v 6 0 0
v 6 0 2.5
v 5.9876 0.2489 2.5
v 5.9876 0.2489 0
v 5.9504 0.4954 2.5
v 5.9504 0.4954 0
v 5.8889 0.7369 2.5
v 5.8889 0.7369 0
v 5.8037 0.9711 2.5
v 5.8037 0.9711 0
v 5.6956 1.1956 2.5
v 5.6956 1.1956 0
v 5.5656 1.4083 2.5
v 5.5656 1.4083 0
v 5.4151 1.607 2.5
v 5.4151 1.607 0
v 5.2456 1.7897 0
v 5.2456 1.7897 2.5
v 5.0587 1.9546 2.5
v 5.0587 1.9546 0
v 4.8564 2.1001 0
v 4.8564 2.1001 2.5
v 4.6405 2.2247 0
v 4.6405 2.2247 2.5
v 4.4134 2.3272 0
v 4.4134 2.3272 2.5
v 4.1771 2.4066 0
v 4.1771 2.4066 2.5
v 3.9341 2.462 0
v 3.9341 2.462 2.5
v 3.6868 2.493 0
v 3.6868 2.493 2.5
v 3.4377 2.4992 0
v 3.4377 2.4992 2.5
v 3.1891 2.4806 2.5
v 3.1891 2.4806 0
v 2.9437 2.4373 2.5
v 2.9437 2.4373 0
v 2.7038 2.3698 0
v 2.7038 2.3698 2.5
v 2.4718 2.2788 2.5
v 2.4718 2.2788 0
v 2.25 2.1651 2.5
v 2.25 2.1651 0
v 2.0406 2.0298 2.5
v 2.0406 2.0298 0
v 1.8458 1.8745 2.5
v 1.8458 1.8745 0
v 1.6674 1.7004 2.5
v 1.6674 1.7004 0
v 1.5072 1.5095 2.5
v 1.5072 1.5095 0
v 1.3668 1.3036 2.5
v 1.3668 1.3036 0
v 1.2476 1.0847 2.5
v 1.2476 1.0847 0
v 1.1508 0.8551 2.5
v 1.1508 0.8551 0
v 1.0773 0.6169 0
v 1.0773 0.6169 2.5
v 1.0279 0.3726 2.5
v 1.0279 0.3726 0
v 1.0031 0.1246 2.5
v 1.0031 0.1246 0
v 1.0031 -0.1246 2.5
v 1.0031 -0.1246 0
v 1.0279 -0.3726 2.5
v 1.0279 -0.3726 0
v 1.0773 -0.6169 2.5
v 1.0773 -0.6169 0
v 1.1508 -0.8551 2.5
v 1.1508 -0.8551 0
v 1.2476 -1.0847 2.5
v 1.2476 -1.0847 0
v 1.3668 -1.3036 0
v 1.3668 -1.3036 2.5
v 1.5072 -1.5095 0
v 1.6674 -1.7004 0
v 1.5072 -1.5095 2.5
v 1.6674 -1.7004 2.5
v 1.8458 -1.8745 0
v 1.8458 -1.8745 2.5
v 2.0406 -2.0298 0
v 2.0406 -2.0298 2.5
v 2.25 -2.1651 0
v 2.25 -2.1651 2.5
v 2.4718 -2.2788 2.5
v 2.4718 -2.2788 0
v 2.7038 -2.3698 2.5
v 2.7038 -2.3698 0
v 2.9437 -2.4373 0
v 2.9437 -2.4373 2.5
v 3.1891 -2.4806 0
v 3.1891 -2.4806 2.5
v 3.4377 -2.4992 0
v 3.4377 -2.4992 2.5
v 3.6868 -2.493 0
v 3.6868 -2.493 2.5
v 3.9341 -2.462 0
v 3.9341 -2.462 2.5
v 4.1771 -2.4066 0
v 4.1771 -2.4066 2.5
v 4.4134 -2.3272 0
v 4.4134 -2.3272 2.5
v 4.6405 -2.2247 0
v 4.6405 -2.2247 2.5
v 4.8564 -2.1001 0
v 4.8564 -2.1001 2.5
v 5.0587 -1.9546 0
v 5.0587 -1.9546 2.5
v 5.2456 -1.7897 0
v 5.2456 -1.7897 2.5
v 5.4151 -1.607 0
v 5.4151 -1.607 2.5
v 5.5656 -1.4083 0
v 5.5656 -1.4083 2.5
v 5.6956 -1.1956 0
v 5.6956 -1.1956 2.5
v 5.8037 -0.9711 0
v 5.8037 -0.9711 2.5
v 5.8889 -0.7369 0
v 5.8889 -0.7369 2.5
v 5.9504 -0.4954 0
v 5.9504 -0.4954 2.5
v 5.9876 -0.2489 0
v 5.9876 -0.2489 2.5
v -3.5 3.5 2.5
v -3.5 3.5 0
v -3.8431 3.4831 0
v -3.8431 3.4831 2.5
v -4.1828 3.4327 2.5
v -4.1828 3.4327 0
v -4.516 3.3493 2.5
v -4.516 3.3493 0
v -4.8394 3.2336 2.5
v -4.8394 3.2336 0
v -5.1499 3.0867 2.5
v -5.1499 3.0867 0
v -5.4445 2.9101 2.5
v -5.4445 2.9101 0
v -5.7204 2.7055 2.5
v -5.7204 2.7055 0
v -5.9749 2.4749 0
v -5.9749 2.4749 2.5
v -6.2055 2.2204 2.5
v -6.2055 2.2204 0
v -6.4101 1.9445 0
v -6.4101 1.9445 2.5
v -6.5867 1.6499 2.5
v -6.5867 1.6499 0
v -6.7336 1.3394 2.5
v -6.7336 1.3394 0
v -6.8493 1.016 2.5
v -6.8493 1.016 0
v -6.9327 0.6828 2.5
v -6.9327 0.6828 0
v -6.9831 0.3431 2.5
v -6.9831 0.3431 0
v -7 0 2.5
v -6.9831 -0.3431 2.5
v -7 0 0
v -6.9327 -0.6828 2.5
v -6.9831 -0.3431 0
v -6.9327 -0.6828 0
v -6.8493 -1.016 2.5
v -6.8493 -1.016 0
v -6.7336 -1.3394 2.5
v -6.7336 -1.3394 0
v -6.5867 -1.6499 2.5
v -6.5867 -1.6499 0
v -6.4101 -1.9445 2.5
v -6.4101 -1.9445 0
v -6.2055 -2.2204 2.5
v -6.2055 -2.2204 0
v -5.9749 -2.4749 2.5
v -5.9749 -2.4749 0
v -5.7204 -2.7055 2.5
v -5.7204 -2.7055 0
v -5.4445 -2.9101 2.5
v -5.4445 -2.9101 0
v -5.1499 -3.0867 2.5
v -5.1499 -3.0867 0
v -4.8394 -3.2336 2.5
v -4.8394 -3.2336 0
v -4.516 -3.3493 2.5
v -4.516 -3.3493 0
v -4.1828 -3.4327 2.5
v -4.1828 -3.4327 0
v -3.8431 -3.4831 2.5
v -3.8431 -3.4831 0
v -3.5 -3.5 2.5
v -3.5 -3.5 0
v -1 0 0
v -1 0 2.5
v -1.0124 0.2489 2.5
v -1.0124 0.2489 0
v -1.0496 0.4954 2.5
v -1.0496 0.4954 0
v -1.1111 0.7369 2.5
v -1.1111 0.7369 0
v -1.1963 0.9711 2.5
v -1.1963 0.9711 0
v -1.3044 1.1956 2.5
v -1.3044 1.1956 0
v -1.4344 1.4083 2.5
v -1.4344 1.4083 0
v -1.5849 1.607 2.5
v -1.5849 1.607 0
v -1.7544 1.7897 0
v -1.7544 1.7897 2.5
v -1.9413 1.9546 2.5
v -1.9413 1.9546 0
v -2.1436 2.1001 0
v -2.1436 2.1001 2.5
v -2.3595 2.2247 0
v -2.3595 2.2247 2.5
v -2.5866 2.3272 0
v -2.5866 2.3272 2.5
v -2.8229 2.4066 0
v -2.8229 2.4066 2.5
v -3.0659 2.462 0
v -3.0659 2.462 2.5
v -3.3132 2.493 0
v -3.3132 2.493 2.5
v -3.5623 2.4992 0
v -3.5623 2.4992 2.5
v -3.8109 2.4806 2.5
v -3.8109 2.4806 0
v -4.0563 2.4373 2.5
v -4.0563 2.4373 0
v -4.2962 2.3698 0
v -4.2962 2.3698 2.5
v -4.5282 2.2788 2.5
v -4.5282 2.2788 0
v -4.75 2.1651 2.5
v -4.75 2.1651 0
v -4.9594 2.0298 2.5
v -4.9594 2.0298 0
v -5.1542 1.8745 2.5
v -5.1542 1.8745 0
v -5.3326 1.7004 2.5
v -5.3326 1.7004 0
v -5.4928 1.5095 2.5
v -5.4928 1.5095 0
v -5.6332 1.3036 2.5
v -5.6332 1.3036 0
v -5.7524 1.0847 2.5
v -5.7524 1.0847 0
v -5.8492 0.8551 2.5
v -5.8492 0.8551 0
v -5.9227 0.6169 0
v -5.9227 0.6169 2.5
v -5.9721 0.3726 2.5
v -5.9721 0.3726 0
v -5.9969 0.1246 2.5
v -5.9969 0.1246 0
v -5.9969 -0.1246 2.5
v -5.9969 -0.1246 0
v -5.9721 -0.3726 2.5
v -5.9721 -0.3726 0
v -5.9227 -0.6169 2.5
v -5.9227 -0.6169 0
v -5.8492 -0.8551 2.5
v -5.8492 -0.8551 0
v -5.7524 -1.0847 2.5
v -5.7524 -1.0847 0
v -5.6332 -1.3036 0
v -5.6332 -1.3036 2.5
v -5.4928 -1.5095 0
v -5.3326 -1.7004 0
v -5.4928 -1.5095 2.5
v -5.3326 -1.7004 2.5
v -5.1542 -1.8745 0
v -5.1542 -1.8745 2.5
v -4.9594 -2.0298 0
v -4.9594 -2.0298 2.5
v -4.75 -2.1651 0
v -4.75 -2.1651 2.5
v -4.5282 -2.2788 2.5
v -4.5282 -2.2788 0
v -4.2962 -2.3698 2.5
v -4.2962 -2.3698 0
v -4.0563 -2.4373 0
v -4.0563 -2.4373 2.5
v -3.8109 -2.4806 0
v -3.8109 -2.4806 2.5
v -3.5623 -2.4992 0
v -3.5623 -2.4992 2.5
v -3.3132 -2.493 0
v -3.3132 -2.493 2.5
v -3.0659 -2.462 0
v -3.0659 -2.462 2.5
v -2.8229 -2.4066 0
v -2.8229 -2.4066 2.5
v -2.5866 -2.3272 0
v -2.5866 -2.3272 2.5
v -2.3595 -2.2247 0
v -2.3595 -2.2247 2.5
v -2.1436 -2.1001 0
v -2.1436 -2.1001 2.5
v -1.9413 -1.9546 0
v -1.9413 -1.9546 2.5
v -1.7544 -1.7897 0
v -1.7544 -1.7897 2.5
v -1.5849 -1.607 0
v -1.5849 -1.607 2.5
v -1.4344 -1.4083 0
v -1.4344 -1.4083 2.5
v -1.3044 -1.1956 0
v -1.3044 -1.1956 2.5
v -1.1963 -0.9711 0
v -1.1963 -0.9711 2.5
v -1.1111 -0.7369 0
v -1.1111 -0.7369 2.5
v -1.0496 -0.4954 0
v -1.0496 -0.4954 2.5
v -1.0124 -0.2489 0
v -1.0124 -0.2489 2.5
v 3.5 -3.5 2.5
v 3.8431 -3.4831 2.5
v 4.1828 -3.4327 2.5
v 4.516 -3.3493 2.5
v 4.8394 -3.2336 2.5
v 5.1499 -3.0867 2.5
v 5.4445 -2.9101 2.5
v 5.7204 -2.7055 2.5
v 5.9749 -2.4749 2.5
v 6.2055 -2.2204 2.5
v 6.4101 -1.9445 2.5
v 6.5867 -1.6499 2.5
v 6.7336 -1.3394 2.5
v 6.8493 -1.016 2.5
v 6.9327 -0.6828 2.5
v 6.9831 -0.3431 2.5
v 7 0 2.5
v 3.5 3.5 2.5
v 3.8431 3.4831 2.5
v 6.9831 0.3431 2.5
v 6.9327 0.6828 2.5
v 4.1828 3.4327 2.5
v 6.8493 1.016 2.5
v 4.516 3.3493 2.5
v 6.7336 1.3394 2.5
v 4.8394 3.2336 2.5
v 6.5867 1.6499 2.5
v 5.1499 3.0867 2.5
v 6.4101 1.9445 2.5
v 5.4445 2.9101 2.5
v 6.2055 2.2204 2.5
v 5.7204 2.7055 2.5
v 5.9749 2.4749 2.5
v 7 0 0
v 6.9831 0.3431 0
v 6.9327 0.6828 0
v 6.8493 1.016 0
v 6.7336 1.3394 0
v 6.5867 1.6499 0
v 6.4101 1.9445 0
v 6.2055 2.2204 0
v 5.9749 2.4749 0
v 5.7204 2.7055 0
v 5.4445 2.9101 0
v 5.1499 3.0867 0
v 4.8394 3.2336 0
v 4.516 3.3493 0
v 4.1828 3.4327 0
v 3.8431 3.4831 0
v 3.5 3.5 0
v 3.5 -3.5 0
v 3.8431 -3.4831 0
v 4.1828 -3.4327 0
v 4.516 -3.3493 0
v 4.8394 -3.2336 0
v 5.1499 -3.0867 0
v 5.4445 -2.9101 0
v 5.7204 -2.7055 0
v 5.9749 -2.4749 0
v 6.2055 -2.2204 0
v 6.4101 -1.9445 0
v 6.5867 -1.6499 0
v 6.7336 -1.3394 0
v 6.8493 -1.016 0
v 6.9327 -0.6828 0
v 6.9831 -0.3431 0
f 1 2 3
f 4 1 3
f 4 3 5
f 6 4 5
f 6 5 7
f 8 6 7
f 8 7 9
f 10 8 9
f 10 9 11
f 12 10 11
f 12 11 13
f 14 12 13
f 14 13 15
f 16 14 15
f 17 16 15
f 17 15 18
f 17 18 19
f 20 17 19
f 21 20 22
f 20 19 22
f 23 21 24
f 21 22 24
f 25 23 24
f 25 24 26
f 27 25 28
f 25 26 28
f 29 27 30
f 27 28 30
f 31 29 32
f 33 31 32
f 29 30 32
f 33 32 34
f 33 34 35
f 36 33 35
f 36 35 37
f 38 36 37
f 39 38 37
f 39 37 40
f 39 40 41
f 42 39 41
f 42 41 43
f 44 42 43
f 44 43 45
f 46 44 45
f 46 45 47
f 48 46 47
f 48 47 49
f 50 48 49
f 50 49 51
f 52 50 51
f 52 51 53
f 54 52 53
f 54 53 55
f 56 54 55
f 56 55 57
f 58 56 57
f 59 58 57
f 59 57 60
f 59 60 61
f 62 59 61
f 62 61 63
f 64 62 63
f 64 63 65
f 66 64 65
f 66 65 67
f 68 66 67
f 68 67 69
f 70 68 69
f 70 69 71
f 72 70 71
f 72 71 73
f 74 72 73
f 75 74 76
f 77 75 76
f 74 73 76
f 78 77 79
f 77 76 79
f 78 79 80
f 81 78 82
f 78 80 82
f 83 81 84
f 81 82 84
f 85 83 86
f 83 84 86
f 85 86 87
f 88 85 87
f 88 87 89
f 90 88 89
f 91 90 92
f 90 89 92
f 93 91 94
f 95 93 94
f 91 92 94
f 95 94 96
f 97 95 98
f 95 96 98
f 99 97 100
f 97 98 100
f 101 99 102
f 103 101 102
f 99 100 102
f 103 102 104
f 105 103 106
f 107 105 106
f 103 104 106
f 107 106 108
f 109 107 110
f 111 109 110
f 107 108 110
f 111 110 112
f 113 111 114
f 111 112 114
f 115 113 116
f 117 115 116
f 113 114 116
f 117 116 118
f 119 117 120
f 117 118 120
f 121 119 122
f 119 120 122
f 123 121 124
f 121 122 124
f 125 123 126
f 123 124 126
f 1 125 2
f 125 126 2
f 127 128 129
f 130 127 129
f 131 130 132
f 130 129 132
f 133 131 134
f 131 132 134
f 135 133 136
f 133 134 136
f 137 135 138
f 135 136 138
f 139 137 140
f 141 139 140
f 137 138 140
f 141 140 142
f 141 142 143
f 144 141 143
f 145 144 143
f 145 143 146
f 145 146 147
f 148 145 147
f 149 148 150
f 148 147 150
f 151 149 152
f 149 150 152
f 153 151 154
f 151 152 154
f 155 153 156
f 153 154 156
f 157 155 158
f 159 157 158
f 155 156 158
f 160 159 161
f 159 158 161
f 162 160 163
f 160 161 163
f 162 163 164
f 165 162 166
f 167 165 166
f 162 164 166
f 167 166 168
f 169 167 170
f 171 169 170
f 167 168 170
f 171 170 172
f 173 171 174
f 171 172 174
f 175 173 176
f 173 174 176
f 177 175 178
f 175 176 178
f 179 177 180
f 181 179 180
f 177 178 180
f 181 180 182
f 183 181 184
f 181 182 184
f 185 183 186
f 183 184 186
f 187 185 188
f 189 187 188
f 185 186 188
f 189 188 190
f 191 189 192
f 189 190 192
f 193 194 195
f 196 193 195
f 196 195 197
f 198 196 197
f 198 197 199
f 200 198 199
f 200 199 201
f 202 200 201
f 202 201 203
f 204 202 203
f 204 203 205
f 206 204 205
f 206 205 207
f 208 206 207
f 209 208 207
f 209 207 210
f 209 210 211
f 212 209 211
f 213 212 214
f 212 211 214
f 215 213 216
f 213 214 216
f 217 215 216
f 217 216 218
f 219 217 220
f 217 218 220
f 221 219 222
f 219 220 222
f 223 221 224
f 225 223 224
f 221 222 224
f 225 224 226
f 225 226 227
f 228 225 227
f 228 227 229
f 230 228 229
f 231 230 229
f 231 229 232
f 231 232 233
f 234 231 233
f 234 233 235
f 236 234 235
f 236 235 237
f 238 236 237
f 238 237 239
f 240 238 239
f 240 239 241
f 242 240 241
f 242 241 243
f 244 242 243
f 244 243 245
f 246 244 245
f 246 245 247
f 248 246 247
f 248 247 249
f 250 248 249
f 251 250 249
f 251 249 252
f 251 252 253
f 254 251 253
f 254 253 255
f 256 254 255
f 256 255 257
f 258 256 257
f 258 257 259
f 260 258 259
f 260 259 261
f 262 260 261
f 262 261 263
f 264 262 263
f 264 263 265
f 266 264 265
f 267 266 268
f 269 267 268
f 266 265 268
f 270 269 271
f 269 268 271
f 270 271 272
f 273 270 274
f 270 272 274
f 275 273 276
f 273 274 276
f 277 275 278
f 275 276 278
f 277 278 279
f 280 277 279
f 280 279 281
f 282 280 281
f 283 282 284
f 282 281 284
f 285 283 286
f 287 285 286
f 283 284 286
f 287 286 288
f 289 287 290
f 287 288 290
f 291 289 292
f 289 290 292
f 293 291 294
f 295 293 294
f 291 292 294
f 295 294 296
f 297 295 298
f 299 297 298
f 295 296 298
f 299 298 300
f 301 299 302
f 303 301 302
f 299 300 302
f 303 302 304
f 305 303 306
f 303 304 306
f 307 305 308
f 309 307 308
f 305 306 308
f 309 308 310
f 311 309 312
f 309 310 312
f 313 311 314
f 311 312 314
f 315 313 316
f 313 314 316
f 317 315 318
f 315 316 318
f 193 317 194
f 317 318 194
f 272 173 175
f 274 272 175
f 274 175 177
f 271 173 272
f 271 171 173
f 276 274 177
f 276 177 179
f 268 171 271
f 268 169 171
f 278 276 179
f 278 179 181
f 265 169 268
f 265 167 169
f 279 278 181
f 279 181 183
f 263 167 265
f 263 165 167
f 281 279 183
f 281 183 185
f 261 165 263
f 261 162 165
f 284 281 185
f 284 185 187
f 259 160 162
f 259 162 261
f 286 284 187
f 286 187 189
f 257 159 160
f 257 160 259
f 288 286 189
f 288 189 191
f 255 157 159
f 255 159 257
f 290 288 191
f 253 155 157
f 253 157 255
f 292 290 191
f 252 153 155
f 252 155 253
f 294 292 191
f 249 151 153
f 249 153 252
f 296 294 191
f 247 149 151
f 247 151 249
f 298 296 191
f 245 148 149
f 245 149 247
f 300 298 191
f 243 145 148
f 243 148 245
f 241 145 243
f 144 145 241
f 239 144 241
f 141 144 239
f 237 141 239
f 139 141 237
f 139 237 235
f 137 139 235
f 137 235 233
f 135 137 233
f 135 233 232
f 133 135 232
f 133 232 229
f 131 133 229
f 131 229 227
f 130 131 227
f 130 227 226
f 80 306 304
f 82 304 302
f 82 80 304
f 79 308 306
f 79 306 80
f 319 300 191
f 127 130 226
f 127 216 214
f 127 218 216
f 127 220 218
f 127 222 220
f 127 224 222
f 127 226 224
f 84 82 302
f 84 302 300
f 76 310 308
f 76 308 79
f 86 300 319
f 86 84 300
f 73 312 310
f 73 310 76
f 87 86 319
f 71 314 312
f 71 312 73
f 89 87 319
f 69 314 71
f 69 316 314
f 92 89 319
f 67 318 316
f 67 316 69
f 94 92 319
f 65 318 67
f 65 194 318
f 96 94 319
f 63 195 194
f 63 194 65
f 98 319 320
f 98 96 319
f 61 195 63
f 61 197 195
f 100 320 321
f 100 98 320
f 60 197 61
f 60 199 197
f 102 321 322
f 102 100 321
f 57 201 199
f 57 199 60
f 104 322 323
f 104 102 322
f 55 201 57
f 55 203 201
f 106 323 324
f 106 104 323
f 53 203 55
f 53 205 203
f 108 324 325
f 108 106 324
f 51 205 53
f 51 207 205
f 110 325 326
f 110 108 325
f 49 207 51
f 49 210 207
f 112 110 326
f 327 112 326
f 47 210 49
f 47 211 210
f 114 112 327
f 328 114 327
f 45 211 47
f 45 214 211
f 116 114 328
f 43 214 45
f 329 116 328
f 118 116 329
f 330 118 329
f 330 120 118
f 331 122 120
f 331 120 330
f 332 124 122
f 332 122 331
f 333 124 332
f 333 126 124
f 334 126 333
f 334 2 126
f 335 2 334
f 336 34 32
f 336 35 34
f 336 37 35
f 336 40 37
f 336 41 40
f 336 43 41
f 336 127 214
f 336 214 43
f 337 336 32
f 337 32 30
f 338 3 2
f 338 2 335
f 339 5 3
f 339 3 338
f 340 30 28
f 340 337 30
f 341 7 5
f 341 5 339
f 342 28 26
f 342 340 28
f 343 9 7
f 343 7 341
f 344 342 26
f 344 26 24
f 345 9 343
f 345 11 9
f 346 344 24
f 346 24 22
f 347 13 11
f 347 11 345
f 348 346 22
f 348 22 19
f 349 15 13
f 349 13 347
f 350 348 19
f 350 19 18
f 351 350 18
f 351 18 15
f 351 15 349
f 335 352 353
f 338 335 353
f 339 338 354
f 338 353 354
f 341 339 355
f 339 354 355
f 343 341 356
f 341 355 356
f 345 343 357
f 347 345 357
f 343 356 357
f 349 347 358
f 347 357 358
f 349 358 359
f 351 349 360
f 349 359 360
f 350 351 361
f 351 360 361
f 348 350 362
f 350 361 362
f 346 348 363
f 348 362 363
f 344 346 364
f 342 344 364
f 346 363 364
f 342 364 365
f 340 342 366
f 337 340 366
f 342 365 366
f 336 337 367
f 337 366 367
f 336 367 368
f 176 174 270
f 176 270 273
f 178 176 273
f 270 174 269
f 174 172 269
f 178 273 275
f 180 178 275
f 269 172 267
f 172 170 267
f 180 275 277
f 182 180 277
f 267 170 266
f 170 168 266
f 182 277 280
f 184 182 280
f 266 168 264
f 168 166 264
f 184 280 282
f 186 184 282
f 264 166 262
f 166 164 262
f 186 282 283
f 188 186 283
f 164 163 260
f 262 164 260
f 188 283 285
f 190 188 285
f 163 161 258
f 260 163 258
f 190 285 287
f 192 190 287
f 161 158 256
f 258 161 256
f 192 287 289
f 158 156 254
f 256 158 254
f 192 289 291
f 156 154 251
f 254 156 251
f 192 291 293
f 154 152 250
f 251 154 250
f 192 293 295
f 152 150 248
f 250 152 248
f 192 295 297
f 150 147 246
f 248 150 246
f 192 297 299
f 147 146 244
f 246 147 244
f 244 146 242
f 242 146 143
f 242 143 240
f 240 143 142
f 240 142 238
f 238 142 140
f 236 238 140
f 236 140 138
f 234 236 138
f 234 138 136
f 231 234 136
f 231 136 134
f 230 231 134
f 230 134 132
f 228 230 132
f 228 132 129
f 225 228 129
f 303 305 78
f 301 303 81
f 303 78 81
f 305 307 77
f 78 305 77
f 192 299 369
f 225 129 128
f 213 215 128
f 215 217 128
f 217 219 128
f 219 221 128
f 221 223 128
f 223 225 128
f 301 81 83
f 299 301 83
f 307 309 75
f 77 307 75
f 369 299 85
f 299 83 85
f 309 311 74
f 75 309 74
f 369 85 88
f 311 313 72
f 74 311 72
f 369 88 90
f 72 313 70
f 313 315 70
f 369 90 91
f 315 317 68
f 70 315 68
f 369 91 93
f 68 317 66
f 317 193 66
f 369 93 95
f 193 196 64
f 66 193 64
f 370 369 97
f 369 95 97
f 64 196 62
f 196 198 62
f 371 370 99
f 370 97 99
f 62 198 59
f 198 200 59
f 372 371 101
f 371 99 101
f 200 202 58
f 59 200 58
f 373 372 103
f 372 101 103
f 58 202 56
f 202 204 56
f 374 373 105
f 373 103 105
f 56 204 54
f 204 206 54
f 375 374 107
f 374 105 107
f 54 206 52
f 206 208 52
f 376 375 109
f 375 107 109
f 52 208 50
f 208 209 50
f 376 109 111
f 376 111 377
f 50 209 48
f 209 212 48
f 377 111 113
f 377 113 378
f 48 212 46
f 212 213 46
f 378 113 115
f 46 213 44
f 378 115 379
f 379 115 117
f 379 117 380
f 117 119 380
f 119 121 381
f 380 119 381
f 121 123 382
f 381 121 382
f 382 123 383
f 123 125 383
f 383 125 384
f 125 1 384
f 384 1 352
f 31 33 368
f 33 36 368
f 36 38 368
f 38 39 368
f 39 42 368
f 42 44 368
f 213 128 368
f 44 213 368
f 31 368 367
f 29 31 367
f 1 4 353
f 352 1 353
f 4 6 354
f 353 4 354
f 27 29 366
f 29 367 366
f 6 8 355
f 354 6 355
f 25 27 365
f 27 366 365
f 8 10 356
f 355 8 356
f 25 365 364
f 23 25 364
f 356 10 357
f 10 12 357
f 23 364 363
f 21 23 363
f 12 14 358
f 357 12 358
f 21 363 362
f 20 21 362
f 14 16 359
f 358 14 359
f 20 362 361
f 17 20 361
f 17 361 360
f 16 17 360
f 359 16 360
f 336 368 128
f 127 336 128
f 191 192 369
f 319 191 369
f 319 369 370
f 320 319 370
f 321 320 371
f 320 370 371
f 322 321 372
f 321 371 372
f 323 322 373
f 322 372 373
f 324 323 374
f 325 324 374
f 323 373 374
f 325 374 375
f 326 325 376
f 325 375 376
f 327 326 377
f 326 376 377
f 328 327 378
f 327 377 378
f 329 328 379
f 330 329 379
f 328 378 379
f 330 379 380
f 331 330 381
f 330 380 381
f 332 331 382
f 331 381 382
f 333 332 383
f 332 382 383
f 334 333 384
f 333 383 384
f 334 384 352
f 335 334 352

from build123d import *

# Parameters (mm, degrees)
F1_DEPTH = 2.5
F2_R     = 2.5
F3_DEPTH = 25


with BuildPart() as f1:
    # F0 (on Top) → F1 (new body)
    with BuildSketch(Plane.XY):
        with BuildLine():
            ThreePointArc((3.5, -3.5), (5.9748737342, -2.4748737342), (7, 0))
            ThreePointArc((7, 0), (5.9748737342, 2.4748737342), (3.5, 3.5))
            Line((3.5, 3.5), (3.5, -3.5))
        make_face()
        with BuildLine():
            ThreePointArc((-3.5, -3.5), (-1.0251262658, -2.4748737342), (0, 0))
            ThreePointArc((0, 0), (-1.0251262658, 2.4748737342), (-3.5, 3.5))
            ThreePointArc((-3.5, 3.5), (-7, 0), (-3.5, -3.5))
        make_face()
        with BuildLine():
            ThreePointArc((0, 0), (1.0251262658, 2.4748737342), (3.5, 3.5))
            Line((3.5, 3.5), (0, 3.5))
            Line((0, 3.5), (0, 0))
        make_face()
        with BuildLine():
            Line((3.5, -3.5), (3.5, 3.5))
            ThreePointArc((3.5, 3.5), (1.0251262658, 2.4748737342), (0, 0))
            ThreePointArc((0, 0), (1.0251262658, -2.4748737342), (3.5, -3.5))
        make_face()
        with BuildLine():
            ThreePointArc((-3.5, 3.5), (-1.0251262658, 2.4748737342), (0, 0))
            Line((0, 0), (0, 3.5))
            Line((0, 3.5), (-3.5, 3.5))
        make_face()
        with BuildLine():
            Line((0, -3.5), (0, 0))
            ThreePointArc((0, 0), (-1.0251262658, -2.4748737342), (-3.5, -3.5))
            Line((-3.5, -3.5), (0, -3.5))
        make_face()
        with BuildLine():
            Line((0, -3.5), (3.5, -3.5))
            ThreePointArc((3.5, -3.5), (1.0251262658, -2.4748737342), (0, 0))
            Line((0, 0), (0, -3.5))
        make_face()
    extrude(amount=F1_DEPTH)

    # F2 (on face) → F3 (cut)
    with BuildSketch(Plane.XY.offset(2.5)):
        with Locations((-3.5, 0)):
            Circle(F2_R)
        with Locations((3.5, 0)):
            Circle(F2_R)
    extrude(amount=-F3_DEPTH, mode=Mode.SUBTRACT)


solid = f1.part
